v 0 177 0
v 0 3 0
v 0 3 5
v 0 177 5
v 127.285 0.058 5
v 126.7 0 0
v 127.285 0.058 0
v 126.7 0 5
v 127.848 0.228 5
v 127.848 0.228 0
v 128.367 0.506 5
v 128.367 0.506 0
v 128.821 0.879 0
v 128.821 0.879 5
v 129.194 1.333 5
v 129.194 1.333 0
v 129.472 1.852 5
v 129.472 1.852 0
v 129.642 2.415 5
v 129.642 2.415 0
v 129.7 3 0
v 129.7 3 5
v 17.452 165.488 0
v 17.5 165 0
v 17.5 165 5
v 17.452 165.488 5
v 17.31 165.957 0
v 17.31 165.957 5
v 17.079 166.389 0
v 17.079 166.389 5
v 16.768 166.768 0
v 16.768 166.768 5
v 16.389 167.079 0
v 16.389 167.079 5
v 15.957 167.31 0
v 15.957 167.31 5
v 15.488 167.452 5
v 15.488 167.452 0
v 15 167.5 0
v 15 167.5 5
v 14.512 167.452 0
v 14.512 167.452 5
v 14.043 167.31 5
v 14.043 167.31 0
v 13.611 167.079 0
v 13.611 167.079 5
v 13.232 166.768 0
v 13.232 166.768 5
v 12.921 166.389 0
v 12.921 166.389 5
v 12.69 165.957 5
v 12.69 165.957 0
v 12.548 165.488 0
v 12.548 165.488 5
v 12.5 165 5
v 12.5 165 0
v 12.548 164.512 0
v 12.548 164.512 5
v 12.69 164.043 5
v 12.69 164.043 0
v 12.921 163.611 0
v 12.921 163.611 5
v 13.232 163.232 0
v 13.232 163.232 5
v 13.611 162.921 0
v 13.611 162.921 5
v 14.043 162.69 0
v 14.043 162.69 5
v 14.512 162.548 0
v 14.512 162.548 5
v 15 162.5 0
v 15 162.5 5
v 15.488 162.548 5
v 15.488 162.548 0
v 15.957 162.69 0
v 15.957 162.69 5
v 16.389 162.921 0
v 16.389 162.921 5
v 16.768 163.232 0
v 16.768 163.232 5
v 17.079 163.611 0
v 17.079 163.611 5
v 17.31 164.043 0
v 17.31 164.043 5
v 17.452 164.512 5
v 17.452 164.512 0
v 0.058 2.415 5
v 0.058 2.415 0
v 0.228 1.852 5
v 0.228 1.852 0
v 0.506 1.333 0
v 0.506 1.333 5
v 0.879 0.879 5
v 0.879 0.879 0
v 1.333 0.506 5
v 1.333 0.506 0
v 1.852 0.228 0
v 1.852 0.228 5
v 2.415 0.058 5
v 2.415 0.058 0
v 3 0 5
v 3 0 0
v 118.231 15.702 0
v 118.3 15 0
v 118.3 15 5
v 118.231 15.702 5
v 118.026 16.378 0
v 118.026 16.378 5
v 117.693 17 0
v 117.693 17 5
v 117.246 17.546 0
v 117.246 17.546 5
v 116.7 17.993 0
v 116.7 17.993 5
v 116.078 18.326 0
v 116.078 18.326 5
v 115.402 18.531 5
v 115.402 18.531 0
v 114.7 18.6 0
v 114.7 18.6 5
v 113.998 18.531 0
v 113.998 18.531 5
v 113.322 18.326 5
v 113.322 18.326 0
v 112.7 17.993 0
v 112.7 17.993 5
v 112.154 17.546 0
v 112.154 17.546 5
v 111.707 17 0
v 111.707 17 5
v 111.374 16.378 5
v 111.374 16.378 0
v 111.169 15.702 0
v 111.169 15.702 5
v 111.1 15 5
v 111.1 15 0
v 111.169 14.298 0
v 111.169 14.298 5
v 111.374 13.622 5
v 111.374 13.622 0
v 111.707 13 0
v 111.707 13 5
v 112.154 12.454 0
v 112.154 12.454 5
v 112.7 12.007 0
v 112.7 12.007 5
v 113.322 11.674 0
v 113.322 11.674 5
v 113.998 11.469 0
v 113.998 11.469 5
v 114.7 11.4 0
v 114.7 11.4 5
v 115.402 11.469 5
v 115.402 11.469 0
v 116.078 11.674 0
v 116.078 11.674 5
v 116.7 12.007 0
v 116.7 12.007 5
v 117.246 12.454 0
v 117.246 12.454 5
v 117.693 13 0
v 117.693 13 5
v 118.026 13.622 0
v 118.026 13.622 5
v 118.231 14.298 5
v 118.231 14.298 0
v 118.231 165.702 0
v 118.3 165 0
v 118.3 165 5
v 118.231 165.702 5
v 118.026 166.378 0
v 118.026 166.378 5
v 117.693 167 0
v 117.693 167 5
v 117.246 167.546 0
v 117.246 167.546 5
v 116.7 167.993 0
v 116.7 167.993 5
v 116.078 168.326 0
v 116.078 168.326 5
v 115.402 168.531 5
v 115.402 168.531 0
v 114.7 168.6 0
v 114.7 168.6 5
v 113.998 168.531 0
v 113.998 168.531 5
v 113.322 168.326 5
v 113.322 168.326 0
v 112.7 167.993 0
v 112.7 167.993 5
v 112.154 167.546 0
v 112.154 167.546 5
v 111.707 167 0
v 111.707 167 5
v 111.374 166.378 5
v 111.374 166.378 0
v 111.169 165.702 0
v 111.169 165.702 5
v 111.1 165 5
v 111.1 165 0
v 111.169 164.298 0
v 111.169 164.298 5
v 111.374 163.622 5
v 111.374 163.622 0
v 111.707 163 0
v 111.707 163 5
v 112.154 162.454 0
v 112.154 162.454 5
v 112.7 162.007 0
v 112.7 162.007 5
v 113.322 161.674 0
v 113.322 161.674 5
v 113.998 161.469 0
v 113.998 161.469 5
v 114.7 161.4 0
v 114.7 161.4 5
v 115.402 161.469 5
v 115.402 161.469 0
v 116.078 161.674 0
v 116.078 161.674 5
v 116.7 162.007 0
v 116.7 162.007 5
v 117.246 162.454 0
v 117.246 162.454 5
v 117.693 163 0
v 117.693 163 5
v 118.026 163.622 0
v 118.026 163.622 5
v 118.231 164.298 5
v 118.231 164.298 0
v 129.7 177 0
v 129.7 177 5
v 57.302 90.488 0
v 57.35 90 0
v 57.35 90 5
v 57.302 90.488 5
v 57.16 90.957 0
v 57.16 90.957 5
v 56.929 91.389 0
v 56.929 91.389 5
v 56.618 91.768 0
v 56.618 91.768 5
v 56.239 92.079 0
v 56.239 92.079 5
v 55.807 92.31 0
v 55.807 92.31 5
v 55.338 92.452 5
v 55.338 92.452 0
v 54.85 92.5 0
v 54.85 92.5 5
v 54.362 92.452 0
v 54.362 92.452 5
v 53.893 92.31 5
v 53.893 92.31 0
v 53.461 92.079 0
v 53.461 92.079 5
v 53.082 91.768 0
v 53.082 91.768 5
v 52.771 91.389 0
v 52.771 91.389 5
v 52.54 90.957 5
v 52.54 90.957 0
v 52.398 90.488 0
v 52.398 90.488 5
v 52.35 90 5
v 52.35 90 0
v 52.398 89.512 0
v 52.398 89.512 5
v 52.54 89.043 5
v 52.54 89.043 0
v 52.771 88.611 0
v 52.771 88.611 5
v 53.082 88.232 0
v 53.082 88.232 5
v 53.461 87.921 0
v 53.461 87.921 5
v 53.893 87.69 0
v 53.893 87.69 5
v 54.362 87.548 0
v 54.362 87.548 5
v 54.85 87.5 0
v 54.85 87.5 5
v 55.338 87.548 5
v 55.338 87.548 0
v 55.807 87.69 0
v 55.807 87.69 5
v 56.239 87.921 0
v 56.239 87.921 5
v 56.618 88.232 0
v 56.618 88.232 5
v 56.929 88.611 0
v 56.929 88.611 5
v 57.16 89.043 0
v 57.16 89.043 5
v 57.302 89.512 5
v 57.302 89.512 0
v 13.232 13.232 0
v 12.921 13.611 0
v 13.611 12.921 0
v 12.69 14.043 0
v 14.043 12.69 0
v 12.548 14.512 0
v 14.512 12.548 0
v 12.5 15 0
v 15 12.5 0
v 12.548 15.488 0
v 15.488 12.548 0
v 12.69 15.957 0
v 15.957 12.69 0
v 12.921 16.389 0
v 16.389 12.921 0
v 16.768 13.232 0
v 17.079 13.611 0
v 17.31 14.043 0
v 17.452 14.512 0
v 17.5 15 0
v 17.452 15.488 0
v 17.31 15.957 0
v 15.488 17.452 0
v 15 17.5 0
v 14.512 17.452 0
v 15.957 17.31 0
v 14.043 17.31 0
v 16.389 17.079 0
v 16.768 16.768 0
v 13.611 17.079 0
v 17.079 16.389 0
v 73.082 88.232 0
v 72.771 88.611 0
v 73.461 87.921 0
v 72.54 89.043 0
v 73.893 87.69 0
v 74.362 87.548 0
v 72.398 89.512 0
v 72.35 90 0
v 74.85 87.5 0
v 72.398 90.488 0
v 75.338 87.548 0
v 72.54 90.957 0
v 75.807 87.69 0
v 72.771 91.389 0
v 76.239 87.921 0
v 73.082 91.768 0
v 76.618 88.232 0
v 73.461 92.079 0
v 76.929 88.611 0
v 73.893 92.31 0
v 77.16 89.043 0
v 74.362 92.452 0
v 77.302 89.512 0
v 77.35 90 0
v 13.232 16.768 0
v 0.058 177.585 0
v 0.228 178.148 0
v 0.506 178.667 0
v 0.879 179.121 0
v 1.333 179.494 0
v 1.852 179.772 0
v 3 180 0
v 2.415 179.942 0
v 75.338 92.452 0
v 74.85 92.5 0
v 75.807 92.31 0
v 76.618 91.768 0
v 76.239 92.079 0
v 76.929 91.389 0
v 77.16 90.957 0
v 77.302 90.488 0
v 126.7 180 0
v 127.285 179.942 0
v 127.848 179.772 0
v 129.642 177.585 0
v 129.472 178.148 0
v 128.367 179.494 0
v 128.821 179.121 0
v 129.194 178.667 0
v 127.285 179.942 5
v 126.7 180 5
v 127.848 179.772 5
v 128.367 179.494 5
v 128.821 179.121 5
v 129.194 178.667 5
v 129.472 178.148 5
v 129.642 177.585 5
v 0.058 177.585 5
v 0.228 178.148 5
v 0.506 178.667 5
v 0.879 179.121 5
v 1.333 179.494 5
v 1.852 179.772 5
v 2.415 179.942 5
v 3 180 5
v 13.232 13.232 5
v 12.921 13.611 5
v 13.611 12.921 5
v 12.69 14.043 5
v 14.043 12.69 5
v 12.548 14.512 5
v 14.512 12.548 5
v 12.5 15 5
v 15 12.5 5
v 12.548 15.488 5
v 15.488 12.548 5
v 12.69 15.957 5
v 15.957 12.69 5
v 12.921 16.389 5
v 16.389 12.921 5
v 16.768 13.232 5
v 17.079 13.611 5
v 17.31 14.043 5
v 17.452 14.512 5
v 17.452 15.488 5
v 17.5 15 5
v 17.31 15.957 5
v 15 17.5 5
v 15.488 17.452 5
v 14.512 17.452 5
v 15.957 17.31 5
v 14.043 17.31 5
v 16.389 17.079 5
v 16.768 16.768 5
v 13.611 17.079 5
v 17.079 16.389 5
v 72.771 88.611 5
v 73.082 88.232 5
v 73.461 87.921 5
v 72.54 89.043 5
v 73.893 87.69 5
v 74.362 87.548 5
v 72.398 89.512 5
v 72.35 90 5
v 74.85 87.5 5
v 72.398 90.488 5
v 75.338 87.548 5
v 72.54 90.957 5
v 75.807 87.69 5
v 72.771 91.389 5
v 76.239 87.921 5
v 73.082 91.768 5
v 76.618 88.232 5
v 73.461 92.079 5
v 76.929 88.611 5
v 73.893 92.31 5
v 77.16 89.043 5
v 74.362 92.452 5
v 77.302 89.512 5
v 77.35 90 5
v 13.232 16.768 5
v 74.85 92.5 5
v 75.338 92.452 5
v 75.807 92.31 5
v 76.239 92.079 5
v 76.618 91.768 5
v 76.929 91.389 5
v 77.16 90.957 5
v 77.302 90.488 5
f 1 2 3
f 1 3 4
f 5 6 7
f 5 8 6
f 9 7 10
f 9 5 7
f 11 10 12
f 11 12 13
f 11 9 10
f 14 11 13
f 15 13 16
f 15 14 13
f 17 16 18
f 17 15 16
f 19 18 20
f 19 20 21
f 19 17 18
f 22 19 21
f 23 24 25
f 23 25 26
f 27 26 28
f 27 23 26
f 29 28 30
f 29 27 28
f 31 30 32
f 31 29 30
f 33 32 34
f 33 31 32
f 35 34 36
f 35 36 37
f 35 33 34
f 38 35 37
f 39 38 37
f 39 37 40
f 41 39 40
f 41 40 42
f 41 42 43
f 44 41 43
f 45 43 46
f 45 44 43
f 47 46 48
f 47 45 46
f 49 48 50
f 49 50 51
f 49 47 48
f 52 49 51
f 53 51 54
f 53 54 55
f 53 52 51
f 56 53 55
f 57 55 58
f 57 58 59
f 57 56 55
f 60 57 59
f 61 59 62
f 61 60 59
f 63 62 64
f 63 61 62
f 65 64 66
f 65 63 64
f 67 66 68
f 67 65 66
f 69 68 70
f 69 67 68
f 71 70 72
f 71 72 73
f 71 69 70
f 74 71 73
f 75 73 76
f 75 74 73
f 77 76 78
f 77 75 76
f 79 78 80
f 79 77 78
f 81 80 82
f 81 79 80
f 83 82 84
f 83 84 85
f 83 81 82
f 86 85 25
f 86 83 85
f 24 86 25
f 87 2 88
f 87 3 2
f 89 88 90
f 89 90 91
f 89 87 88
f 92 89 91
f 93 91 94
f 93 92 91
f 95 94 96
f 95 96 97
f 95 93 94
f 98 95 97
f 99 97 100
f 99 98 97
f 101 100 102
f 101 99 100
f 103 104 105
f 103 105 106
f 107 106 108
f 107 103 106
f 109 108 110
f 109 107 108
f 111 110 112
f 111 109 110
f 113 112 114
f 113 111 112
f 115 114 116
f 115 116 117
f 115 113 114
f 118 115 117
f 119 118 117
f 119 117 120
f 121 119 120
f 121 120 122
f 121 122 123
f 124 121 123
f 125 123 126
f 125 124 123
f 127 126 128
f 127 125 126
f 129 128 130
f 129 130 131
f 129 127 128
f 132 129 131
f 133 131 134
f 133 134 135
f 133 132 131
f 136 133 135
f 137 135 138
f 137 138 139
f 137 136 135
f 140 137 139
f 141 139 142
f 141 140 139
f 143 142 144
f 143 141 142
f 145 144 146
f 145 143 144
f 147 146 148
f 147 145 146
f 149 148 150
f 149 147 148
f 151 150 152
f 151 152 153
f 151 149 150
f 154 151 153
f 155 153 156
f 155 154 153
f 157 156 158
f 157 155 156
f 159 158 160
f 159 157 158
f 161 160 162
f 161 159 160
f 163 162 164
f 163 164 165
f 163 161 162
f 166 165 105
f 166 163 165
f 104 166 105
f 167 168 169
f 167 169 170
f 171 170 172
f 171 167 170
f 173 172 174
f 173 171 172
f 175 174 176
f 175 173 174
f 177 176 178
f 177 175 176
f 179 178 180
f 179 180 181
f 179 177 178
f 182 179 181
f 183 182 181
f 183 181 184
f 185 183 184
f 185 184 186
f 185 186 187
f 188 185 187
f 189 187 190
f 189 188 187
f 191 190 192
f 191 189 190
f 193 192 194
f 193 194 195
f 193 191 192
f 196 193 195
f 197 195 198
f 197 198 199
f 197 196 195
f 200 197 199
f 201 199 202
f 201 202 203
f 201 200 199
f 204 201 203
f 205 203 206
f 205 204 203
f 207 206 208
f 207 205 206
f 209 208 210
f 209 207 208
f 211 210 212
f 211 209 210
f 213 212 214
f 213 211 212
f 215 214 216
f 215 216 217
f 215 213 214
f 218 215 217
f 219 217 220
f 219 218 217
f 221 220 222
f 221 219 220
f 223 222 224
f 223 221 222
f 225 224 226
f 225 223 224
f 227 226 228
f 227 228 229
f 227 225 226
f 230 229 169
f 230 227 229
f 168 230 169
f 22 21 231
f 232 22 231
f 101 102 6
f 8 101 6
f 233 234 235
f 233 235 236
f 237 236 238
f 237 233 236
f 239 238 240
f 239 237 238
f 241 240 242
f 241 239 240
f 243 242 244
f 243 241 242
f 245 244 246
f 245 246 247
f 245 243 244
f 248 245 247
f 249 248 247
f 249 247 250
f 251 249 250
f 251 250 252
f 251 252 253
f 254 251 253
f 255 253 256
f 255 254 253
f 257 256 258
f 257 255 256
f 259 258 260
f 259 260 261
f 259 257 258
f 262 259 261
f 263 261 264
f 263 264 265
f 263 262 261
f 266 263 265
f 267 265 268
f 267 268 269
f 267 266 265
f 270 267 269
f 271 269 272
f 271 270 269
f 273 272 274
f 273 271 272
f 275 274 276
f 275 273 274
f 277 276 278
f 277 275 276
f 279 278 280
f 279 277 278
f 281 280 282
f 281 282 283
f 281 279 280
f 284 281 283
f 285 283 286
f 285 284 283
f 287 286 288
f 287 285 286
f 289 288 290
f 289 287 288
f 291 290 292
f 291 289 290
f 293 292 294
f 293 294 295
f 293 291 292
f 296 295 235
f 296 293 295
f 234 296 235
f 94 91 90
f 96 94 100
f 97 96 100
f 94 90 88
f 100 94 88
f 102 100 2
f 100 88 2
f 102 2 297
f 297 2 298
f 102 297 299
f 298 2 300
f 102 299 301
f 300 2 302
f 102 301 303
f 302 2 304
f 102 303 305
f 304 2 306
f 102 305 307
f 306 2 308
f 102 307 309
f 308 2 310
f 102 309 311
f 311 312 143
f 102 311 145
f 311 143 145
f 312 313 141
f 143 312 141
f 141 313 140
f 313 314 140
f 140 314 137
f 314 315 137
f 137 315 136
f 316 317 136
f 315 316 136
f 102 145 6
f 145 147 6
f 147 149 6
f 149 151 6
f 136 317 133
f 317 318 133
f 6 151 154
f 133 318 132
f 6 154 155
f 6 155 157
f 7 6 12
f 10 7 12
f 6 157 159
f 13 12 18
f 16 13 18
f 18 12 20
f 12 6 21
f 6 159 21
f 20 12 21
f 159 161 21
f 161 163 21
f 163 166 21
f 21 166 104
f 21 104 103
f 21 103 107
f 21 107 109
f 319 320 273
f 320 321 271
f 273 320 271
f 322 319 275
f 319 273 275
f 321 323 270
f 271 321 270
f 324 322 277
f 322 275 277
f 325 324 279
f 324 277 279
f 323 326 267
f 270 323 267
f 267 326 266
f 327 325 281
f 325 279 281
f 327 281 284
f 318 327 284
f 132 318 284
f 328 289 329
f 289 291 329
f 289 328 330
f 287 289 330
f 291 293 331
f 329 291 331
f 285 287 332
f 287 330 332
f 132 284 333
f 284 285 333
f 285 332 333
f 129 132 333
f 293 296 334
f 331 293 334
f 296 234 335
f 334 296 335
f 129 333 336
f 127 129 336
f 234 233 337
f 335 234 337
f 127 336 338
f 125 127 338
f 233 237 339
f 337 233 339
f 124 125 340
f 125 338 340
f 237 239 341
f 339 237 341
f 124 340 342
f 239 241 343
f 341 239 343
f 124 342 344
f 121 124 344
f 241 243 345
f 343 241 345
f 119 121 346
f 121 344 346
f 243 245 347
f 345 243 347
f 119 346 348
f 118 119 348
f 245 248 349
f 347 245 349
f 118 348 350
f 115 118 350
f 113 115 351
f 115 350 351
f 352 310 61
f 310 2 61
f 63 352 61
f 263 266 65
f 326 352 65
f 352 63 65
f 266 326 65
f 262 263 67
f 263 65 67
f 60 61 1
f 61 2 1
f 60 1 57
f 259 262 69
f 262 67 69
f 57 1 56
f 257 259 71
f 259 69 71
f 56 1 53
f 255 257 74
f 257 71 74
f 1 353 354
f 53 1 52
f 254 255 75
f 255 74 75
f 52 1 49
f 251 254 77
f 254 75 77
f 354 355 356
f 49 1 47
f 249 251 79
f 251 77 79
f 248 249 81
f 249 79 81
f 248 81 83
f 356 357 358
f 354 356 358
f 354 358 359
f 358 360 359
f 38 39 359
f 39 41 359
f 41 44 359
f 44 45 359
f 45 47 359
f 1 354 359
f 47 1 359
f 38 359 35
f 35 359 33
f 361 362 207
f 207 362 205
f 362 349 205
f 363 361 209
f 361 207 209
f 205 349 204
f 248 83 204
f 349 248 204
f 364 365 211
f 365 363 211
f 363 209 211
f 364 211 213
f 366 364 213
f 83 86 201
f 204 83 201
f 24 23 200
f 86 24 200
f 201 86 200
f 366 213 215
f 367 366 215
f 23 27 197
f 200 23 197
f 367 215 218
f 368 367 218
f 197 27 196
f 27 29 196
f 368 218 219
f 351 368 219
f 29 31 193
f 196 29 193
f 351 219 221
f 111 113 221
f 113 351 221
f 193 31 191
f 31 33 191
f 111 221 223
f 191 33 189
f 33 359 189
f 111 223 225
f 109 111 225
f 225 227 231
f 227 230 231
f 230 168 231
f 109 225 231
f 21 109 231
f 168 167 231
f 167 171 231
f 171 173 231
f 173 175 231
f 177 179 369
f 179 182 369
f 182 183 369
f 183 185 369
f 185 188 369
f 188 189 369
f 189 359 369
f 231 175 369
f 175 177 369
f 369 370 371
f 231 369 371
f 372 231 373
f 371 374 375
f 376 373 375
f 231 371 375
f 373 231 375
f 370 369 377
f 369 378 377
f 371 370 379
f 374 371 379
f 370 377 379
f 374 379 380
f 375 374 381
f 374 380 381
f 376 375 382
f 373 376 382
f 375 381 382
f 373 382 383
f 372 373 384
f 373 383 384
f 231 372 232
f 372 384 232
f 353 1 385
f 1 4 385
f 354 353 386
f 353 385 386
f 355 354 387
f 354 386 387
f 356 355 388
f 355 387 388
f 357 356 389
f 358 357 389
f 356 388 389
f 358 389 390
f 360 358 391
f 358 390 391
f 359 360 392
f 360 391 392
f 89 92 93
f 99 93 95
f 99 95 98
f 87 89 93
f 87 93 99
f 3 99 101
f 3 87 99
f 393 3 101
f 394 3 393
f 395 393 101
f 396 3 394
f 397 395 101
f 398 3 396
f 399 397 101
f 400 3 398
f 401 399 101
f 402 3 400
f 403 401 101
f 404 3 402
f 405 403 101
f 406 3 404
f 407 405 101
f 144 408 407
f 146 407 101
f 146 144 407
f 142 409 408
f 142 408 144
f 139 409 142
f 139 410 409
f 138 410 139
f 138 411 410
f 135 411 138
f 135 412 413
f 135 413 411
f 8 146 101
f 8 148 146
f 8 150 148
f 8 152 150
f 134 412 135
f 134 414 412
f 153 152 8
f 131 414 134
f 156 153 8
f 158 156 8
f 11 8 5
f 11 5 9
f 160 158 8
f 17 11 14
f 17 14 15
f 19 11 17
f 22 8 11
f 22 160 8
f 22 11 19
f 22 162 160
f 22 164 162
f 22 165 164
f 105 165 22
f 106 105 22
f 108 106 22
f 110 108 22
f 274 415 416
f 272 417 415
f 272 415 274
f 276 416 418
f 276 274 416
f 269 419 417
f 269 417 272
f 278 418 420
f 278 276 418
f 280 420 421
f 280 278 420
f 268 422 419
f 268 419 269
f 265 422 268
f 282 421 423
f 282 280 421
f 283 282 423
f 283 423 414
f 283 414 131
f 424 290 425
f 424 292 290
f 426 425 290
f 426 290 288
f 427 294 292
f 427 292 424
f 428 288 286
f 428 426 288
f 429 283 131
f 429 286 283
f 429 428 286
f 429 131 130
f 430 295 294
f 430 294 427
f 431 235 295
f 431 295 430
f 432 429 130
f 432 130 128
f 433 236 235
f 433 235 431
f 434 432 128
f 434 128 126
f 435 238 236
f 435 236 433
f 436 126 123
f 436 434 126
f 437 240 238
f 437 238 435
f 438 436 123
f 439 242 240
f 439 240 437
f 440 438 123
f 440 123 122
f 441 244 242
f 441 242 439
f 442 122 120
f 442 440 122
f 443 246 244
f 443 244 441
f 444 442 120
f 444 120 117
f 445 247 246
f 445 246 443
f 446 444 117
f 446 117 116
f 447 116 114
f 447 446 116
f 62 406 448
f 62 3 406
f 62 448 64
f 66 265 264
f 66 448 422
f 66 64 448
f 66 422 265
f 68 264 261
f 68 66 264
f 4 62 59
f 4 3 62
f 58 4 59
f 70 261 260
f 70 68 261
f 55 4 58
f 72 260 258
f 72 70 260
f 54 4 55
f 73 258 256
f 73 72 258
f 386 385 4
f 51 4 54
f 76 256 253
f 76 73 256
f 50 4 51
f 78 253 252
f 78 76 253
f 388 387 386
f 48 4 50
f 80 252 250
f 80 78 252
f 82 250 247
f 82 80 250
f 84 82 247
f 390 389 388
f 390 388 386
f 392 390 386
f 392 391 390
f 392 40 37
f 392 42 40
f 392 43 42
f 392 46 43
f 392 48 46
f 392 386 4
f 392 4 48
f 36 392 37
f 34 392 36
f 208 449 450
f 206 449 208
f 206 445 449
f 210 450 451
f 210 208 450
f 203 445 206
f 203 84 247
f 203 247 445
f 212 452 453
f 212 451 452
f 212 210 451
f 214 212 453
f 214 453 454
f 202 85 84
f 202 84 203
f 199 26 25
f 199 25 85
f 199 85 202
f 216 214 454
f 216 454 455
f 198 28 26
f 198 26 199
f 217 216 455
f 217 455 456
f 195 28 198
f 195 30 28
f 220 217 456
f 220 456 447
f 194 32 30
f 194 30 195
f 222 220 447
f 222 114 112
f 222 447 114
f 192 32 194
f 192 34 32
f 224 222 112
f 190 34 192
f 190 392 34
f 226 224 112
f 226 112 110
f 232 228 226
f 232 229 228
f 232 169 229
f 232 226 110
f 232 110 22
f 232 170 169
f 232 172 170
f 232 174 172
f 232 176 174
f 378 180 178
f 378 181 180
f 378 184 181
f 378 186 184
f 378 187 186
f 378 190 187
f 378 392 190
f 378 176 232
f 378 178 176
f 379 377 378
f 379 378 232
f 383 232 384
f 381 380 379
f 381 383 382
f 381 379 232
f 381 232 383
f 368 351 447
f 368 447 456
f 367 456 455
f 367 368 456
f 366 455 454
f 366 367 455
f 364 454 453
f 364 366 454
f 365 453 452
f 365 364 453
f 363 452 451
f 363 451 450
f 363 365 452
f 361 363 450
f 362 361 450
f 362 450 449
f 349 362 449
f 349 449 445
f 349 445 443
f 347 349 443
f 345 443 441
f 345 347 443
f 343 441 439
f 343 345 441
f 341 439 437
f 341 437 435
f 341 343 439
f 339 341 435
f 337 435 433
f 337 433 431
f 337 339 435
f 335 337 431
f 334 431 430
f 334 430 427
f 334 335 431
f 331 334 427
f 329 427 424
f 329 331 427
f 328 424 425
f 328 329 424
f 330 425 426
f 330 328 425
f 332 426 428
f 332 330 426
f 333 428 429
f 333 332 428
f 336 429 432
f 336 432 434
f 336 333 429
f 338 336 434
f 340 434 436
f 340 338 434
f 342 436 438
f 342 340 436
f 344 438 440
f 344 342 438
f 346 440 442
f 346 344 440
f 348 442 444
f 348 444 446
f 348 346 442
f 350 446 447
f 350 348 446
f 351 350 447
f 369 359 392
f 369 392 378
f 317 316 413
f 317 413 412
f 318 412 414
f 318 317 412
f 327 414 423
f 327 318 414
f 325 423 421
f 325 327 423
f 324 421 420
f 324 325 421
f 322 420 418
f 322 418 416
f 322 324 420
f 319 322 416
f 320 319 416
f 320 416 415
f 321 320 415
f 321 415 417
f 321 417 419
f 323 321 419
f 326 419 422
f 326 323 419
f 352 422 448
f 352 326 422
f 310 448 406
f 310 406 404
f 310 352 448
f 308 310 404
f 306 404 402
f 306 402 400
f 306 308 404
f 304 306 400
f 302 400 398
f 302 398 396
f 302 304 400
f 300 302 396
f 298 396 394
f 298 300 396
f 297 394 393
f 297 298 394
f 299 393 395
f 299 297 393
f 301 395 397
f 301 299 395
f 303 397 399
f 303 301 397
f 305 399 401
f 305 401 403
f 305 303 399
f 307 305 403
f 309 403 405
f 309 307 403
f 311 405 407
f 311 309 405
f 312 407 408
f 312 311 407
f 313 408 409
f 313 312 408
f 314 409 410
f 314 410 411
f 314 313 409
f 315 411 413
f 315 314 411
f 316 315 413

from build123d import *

# Parameters (mm, degrees)
SKETCH1_W           = 129.7
SKETCH1_H           = 180
SKETCH1_R           = 2.5
SKETCH1_R_2         = 3.6
BOSS_EXTRUDE1_DEPTH = 5
FILLET1_R           = 3


with BuildPart() as part:
    # Sketch1 → Boss-Extrude1 (new body)
    with BuildSketch(Plane.XY):
        with Locations((64.85, 90)):
            Rectangle(SKETCH1_W, SKETCH1_H)
        with Locations((15, 15)):
            Circle(SKETCH1_R, mode=Mode.SUBTRACT)
        with Locations((15, 165)):
            Circle(SKETCH1_R, mode=Mode.SUBTRACT)
        with Locations((114.7, 165)):
            Circle(SKETCH1_R_2, mode=Mode.SUBTRACT)
        with Locations((114.7, 15)):
            Circle(SKETCH1_R_2, mode=Mode.SUBTRACT)
        with Locations((74.85, 90)):
            Circle(SKETCH1_R, mode=Mode.SUBTRACT)
        with Locations((54.85, 90)):
            Circle(SKETCH1_R, mode=Mode.SUBTRACT)
    extrude(amount=BOSS_EXTRUDE1_DEPTH)

    # Fillet1
    fillet1_edges = [part.edges().sort_by_distance(p)[0] for p in [
        (0, 180, 2.5),
        (129.7, 180, 2.5),
        (129.7, 0, 2.5),
        (0, 0, 2.5),
    ]]
    fillet(fillet1_edges, radius=FILLET1_R)


solid = part.part
